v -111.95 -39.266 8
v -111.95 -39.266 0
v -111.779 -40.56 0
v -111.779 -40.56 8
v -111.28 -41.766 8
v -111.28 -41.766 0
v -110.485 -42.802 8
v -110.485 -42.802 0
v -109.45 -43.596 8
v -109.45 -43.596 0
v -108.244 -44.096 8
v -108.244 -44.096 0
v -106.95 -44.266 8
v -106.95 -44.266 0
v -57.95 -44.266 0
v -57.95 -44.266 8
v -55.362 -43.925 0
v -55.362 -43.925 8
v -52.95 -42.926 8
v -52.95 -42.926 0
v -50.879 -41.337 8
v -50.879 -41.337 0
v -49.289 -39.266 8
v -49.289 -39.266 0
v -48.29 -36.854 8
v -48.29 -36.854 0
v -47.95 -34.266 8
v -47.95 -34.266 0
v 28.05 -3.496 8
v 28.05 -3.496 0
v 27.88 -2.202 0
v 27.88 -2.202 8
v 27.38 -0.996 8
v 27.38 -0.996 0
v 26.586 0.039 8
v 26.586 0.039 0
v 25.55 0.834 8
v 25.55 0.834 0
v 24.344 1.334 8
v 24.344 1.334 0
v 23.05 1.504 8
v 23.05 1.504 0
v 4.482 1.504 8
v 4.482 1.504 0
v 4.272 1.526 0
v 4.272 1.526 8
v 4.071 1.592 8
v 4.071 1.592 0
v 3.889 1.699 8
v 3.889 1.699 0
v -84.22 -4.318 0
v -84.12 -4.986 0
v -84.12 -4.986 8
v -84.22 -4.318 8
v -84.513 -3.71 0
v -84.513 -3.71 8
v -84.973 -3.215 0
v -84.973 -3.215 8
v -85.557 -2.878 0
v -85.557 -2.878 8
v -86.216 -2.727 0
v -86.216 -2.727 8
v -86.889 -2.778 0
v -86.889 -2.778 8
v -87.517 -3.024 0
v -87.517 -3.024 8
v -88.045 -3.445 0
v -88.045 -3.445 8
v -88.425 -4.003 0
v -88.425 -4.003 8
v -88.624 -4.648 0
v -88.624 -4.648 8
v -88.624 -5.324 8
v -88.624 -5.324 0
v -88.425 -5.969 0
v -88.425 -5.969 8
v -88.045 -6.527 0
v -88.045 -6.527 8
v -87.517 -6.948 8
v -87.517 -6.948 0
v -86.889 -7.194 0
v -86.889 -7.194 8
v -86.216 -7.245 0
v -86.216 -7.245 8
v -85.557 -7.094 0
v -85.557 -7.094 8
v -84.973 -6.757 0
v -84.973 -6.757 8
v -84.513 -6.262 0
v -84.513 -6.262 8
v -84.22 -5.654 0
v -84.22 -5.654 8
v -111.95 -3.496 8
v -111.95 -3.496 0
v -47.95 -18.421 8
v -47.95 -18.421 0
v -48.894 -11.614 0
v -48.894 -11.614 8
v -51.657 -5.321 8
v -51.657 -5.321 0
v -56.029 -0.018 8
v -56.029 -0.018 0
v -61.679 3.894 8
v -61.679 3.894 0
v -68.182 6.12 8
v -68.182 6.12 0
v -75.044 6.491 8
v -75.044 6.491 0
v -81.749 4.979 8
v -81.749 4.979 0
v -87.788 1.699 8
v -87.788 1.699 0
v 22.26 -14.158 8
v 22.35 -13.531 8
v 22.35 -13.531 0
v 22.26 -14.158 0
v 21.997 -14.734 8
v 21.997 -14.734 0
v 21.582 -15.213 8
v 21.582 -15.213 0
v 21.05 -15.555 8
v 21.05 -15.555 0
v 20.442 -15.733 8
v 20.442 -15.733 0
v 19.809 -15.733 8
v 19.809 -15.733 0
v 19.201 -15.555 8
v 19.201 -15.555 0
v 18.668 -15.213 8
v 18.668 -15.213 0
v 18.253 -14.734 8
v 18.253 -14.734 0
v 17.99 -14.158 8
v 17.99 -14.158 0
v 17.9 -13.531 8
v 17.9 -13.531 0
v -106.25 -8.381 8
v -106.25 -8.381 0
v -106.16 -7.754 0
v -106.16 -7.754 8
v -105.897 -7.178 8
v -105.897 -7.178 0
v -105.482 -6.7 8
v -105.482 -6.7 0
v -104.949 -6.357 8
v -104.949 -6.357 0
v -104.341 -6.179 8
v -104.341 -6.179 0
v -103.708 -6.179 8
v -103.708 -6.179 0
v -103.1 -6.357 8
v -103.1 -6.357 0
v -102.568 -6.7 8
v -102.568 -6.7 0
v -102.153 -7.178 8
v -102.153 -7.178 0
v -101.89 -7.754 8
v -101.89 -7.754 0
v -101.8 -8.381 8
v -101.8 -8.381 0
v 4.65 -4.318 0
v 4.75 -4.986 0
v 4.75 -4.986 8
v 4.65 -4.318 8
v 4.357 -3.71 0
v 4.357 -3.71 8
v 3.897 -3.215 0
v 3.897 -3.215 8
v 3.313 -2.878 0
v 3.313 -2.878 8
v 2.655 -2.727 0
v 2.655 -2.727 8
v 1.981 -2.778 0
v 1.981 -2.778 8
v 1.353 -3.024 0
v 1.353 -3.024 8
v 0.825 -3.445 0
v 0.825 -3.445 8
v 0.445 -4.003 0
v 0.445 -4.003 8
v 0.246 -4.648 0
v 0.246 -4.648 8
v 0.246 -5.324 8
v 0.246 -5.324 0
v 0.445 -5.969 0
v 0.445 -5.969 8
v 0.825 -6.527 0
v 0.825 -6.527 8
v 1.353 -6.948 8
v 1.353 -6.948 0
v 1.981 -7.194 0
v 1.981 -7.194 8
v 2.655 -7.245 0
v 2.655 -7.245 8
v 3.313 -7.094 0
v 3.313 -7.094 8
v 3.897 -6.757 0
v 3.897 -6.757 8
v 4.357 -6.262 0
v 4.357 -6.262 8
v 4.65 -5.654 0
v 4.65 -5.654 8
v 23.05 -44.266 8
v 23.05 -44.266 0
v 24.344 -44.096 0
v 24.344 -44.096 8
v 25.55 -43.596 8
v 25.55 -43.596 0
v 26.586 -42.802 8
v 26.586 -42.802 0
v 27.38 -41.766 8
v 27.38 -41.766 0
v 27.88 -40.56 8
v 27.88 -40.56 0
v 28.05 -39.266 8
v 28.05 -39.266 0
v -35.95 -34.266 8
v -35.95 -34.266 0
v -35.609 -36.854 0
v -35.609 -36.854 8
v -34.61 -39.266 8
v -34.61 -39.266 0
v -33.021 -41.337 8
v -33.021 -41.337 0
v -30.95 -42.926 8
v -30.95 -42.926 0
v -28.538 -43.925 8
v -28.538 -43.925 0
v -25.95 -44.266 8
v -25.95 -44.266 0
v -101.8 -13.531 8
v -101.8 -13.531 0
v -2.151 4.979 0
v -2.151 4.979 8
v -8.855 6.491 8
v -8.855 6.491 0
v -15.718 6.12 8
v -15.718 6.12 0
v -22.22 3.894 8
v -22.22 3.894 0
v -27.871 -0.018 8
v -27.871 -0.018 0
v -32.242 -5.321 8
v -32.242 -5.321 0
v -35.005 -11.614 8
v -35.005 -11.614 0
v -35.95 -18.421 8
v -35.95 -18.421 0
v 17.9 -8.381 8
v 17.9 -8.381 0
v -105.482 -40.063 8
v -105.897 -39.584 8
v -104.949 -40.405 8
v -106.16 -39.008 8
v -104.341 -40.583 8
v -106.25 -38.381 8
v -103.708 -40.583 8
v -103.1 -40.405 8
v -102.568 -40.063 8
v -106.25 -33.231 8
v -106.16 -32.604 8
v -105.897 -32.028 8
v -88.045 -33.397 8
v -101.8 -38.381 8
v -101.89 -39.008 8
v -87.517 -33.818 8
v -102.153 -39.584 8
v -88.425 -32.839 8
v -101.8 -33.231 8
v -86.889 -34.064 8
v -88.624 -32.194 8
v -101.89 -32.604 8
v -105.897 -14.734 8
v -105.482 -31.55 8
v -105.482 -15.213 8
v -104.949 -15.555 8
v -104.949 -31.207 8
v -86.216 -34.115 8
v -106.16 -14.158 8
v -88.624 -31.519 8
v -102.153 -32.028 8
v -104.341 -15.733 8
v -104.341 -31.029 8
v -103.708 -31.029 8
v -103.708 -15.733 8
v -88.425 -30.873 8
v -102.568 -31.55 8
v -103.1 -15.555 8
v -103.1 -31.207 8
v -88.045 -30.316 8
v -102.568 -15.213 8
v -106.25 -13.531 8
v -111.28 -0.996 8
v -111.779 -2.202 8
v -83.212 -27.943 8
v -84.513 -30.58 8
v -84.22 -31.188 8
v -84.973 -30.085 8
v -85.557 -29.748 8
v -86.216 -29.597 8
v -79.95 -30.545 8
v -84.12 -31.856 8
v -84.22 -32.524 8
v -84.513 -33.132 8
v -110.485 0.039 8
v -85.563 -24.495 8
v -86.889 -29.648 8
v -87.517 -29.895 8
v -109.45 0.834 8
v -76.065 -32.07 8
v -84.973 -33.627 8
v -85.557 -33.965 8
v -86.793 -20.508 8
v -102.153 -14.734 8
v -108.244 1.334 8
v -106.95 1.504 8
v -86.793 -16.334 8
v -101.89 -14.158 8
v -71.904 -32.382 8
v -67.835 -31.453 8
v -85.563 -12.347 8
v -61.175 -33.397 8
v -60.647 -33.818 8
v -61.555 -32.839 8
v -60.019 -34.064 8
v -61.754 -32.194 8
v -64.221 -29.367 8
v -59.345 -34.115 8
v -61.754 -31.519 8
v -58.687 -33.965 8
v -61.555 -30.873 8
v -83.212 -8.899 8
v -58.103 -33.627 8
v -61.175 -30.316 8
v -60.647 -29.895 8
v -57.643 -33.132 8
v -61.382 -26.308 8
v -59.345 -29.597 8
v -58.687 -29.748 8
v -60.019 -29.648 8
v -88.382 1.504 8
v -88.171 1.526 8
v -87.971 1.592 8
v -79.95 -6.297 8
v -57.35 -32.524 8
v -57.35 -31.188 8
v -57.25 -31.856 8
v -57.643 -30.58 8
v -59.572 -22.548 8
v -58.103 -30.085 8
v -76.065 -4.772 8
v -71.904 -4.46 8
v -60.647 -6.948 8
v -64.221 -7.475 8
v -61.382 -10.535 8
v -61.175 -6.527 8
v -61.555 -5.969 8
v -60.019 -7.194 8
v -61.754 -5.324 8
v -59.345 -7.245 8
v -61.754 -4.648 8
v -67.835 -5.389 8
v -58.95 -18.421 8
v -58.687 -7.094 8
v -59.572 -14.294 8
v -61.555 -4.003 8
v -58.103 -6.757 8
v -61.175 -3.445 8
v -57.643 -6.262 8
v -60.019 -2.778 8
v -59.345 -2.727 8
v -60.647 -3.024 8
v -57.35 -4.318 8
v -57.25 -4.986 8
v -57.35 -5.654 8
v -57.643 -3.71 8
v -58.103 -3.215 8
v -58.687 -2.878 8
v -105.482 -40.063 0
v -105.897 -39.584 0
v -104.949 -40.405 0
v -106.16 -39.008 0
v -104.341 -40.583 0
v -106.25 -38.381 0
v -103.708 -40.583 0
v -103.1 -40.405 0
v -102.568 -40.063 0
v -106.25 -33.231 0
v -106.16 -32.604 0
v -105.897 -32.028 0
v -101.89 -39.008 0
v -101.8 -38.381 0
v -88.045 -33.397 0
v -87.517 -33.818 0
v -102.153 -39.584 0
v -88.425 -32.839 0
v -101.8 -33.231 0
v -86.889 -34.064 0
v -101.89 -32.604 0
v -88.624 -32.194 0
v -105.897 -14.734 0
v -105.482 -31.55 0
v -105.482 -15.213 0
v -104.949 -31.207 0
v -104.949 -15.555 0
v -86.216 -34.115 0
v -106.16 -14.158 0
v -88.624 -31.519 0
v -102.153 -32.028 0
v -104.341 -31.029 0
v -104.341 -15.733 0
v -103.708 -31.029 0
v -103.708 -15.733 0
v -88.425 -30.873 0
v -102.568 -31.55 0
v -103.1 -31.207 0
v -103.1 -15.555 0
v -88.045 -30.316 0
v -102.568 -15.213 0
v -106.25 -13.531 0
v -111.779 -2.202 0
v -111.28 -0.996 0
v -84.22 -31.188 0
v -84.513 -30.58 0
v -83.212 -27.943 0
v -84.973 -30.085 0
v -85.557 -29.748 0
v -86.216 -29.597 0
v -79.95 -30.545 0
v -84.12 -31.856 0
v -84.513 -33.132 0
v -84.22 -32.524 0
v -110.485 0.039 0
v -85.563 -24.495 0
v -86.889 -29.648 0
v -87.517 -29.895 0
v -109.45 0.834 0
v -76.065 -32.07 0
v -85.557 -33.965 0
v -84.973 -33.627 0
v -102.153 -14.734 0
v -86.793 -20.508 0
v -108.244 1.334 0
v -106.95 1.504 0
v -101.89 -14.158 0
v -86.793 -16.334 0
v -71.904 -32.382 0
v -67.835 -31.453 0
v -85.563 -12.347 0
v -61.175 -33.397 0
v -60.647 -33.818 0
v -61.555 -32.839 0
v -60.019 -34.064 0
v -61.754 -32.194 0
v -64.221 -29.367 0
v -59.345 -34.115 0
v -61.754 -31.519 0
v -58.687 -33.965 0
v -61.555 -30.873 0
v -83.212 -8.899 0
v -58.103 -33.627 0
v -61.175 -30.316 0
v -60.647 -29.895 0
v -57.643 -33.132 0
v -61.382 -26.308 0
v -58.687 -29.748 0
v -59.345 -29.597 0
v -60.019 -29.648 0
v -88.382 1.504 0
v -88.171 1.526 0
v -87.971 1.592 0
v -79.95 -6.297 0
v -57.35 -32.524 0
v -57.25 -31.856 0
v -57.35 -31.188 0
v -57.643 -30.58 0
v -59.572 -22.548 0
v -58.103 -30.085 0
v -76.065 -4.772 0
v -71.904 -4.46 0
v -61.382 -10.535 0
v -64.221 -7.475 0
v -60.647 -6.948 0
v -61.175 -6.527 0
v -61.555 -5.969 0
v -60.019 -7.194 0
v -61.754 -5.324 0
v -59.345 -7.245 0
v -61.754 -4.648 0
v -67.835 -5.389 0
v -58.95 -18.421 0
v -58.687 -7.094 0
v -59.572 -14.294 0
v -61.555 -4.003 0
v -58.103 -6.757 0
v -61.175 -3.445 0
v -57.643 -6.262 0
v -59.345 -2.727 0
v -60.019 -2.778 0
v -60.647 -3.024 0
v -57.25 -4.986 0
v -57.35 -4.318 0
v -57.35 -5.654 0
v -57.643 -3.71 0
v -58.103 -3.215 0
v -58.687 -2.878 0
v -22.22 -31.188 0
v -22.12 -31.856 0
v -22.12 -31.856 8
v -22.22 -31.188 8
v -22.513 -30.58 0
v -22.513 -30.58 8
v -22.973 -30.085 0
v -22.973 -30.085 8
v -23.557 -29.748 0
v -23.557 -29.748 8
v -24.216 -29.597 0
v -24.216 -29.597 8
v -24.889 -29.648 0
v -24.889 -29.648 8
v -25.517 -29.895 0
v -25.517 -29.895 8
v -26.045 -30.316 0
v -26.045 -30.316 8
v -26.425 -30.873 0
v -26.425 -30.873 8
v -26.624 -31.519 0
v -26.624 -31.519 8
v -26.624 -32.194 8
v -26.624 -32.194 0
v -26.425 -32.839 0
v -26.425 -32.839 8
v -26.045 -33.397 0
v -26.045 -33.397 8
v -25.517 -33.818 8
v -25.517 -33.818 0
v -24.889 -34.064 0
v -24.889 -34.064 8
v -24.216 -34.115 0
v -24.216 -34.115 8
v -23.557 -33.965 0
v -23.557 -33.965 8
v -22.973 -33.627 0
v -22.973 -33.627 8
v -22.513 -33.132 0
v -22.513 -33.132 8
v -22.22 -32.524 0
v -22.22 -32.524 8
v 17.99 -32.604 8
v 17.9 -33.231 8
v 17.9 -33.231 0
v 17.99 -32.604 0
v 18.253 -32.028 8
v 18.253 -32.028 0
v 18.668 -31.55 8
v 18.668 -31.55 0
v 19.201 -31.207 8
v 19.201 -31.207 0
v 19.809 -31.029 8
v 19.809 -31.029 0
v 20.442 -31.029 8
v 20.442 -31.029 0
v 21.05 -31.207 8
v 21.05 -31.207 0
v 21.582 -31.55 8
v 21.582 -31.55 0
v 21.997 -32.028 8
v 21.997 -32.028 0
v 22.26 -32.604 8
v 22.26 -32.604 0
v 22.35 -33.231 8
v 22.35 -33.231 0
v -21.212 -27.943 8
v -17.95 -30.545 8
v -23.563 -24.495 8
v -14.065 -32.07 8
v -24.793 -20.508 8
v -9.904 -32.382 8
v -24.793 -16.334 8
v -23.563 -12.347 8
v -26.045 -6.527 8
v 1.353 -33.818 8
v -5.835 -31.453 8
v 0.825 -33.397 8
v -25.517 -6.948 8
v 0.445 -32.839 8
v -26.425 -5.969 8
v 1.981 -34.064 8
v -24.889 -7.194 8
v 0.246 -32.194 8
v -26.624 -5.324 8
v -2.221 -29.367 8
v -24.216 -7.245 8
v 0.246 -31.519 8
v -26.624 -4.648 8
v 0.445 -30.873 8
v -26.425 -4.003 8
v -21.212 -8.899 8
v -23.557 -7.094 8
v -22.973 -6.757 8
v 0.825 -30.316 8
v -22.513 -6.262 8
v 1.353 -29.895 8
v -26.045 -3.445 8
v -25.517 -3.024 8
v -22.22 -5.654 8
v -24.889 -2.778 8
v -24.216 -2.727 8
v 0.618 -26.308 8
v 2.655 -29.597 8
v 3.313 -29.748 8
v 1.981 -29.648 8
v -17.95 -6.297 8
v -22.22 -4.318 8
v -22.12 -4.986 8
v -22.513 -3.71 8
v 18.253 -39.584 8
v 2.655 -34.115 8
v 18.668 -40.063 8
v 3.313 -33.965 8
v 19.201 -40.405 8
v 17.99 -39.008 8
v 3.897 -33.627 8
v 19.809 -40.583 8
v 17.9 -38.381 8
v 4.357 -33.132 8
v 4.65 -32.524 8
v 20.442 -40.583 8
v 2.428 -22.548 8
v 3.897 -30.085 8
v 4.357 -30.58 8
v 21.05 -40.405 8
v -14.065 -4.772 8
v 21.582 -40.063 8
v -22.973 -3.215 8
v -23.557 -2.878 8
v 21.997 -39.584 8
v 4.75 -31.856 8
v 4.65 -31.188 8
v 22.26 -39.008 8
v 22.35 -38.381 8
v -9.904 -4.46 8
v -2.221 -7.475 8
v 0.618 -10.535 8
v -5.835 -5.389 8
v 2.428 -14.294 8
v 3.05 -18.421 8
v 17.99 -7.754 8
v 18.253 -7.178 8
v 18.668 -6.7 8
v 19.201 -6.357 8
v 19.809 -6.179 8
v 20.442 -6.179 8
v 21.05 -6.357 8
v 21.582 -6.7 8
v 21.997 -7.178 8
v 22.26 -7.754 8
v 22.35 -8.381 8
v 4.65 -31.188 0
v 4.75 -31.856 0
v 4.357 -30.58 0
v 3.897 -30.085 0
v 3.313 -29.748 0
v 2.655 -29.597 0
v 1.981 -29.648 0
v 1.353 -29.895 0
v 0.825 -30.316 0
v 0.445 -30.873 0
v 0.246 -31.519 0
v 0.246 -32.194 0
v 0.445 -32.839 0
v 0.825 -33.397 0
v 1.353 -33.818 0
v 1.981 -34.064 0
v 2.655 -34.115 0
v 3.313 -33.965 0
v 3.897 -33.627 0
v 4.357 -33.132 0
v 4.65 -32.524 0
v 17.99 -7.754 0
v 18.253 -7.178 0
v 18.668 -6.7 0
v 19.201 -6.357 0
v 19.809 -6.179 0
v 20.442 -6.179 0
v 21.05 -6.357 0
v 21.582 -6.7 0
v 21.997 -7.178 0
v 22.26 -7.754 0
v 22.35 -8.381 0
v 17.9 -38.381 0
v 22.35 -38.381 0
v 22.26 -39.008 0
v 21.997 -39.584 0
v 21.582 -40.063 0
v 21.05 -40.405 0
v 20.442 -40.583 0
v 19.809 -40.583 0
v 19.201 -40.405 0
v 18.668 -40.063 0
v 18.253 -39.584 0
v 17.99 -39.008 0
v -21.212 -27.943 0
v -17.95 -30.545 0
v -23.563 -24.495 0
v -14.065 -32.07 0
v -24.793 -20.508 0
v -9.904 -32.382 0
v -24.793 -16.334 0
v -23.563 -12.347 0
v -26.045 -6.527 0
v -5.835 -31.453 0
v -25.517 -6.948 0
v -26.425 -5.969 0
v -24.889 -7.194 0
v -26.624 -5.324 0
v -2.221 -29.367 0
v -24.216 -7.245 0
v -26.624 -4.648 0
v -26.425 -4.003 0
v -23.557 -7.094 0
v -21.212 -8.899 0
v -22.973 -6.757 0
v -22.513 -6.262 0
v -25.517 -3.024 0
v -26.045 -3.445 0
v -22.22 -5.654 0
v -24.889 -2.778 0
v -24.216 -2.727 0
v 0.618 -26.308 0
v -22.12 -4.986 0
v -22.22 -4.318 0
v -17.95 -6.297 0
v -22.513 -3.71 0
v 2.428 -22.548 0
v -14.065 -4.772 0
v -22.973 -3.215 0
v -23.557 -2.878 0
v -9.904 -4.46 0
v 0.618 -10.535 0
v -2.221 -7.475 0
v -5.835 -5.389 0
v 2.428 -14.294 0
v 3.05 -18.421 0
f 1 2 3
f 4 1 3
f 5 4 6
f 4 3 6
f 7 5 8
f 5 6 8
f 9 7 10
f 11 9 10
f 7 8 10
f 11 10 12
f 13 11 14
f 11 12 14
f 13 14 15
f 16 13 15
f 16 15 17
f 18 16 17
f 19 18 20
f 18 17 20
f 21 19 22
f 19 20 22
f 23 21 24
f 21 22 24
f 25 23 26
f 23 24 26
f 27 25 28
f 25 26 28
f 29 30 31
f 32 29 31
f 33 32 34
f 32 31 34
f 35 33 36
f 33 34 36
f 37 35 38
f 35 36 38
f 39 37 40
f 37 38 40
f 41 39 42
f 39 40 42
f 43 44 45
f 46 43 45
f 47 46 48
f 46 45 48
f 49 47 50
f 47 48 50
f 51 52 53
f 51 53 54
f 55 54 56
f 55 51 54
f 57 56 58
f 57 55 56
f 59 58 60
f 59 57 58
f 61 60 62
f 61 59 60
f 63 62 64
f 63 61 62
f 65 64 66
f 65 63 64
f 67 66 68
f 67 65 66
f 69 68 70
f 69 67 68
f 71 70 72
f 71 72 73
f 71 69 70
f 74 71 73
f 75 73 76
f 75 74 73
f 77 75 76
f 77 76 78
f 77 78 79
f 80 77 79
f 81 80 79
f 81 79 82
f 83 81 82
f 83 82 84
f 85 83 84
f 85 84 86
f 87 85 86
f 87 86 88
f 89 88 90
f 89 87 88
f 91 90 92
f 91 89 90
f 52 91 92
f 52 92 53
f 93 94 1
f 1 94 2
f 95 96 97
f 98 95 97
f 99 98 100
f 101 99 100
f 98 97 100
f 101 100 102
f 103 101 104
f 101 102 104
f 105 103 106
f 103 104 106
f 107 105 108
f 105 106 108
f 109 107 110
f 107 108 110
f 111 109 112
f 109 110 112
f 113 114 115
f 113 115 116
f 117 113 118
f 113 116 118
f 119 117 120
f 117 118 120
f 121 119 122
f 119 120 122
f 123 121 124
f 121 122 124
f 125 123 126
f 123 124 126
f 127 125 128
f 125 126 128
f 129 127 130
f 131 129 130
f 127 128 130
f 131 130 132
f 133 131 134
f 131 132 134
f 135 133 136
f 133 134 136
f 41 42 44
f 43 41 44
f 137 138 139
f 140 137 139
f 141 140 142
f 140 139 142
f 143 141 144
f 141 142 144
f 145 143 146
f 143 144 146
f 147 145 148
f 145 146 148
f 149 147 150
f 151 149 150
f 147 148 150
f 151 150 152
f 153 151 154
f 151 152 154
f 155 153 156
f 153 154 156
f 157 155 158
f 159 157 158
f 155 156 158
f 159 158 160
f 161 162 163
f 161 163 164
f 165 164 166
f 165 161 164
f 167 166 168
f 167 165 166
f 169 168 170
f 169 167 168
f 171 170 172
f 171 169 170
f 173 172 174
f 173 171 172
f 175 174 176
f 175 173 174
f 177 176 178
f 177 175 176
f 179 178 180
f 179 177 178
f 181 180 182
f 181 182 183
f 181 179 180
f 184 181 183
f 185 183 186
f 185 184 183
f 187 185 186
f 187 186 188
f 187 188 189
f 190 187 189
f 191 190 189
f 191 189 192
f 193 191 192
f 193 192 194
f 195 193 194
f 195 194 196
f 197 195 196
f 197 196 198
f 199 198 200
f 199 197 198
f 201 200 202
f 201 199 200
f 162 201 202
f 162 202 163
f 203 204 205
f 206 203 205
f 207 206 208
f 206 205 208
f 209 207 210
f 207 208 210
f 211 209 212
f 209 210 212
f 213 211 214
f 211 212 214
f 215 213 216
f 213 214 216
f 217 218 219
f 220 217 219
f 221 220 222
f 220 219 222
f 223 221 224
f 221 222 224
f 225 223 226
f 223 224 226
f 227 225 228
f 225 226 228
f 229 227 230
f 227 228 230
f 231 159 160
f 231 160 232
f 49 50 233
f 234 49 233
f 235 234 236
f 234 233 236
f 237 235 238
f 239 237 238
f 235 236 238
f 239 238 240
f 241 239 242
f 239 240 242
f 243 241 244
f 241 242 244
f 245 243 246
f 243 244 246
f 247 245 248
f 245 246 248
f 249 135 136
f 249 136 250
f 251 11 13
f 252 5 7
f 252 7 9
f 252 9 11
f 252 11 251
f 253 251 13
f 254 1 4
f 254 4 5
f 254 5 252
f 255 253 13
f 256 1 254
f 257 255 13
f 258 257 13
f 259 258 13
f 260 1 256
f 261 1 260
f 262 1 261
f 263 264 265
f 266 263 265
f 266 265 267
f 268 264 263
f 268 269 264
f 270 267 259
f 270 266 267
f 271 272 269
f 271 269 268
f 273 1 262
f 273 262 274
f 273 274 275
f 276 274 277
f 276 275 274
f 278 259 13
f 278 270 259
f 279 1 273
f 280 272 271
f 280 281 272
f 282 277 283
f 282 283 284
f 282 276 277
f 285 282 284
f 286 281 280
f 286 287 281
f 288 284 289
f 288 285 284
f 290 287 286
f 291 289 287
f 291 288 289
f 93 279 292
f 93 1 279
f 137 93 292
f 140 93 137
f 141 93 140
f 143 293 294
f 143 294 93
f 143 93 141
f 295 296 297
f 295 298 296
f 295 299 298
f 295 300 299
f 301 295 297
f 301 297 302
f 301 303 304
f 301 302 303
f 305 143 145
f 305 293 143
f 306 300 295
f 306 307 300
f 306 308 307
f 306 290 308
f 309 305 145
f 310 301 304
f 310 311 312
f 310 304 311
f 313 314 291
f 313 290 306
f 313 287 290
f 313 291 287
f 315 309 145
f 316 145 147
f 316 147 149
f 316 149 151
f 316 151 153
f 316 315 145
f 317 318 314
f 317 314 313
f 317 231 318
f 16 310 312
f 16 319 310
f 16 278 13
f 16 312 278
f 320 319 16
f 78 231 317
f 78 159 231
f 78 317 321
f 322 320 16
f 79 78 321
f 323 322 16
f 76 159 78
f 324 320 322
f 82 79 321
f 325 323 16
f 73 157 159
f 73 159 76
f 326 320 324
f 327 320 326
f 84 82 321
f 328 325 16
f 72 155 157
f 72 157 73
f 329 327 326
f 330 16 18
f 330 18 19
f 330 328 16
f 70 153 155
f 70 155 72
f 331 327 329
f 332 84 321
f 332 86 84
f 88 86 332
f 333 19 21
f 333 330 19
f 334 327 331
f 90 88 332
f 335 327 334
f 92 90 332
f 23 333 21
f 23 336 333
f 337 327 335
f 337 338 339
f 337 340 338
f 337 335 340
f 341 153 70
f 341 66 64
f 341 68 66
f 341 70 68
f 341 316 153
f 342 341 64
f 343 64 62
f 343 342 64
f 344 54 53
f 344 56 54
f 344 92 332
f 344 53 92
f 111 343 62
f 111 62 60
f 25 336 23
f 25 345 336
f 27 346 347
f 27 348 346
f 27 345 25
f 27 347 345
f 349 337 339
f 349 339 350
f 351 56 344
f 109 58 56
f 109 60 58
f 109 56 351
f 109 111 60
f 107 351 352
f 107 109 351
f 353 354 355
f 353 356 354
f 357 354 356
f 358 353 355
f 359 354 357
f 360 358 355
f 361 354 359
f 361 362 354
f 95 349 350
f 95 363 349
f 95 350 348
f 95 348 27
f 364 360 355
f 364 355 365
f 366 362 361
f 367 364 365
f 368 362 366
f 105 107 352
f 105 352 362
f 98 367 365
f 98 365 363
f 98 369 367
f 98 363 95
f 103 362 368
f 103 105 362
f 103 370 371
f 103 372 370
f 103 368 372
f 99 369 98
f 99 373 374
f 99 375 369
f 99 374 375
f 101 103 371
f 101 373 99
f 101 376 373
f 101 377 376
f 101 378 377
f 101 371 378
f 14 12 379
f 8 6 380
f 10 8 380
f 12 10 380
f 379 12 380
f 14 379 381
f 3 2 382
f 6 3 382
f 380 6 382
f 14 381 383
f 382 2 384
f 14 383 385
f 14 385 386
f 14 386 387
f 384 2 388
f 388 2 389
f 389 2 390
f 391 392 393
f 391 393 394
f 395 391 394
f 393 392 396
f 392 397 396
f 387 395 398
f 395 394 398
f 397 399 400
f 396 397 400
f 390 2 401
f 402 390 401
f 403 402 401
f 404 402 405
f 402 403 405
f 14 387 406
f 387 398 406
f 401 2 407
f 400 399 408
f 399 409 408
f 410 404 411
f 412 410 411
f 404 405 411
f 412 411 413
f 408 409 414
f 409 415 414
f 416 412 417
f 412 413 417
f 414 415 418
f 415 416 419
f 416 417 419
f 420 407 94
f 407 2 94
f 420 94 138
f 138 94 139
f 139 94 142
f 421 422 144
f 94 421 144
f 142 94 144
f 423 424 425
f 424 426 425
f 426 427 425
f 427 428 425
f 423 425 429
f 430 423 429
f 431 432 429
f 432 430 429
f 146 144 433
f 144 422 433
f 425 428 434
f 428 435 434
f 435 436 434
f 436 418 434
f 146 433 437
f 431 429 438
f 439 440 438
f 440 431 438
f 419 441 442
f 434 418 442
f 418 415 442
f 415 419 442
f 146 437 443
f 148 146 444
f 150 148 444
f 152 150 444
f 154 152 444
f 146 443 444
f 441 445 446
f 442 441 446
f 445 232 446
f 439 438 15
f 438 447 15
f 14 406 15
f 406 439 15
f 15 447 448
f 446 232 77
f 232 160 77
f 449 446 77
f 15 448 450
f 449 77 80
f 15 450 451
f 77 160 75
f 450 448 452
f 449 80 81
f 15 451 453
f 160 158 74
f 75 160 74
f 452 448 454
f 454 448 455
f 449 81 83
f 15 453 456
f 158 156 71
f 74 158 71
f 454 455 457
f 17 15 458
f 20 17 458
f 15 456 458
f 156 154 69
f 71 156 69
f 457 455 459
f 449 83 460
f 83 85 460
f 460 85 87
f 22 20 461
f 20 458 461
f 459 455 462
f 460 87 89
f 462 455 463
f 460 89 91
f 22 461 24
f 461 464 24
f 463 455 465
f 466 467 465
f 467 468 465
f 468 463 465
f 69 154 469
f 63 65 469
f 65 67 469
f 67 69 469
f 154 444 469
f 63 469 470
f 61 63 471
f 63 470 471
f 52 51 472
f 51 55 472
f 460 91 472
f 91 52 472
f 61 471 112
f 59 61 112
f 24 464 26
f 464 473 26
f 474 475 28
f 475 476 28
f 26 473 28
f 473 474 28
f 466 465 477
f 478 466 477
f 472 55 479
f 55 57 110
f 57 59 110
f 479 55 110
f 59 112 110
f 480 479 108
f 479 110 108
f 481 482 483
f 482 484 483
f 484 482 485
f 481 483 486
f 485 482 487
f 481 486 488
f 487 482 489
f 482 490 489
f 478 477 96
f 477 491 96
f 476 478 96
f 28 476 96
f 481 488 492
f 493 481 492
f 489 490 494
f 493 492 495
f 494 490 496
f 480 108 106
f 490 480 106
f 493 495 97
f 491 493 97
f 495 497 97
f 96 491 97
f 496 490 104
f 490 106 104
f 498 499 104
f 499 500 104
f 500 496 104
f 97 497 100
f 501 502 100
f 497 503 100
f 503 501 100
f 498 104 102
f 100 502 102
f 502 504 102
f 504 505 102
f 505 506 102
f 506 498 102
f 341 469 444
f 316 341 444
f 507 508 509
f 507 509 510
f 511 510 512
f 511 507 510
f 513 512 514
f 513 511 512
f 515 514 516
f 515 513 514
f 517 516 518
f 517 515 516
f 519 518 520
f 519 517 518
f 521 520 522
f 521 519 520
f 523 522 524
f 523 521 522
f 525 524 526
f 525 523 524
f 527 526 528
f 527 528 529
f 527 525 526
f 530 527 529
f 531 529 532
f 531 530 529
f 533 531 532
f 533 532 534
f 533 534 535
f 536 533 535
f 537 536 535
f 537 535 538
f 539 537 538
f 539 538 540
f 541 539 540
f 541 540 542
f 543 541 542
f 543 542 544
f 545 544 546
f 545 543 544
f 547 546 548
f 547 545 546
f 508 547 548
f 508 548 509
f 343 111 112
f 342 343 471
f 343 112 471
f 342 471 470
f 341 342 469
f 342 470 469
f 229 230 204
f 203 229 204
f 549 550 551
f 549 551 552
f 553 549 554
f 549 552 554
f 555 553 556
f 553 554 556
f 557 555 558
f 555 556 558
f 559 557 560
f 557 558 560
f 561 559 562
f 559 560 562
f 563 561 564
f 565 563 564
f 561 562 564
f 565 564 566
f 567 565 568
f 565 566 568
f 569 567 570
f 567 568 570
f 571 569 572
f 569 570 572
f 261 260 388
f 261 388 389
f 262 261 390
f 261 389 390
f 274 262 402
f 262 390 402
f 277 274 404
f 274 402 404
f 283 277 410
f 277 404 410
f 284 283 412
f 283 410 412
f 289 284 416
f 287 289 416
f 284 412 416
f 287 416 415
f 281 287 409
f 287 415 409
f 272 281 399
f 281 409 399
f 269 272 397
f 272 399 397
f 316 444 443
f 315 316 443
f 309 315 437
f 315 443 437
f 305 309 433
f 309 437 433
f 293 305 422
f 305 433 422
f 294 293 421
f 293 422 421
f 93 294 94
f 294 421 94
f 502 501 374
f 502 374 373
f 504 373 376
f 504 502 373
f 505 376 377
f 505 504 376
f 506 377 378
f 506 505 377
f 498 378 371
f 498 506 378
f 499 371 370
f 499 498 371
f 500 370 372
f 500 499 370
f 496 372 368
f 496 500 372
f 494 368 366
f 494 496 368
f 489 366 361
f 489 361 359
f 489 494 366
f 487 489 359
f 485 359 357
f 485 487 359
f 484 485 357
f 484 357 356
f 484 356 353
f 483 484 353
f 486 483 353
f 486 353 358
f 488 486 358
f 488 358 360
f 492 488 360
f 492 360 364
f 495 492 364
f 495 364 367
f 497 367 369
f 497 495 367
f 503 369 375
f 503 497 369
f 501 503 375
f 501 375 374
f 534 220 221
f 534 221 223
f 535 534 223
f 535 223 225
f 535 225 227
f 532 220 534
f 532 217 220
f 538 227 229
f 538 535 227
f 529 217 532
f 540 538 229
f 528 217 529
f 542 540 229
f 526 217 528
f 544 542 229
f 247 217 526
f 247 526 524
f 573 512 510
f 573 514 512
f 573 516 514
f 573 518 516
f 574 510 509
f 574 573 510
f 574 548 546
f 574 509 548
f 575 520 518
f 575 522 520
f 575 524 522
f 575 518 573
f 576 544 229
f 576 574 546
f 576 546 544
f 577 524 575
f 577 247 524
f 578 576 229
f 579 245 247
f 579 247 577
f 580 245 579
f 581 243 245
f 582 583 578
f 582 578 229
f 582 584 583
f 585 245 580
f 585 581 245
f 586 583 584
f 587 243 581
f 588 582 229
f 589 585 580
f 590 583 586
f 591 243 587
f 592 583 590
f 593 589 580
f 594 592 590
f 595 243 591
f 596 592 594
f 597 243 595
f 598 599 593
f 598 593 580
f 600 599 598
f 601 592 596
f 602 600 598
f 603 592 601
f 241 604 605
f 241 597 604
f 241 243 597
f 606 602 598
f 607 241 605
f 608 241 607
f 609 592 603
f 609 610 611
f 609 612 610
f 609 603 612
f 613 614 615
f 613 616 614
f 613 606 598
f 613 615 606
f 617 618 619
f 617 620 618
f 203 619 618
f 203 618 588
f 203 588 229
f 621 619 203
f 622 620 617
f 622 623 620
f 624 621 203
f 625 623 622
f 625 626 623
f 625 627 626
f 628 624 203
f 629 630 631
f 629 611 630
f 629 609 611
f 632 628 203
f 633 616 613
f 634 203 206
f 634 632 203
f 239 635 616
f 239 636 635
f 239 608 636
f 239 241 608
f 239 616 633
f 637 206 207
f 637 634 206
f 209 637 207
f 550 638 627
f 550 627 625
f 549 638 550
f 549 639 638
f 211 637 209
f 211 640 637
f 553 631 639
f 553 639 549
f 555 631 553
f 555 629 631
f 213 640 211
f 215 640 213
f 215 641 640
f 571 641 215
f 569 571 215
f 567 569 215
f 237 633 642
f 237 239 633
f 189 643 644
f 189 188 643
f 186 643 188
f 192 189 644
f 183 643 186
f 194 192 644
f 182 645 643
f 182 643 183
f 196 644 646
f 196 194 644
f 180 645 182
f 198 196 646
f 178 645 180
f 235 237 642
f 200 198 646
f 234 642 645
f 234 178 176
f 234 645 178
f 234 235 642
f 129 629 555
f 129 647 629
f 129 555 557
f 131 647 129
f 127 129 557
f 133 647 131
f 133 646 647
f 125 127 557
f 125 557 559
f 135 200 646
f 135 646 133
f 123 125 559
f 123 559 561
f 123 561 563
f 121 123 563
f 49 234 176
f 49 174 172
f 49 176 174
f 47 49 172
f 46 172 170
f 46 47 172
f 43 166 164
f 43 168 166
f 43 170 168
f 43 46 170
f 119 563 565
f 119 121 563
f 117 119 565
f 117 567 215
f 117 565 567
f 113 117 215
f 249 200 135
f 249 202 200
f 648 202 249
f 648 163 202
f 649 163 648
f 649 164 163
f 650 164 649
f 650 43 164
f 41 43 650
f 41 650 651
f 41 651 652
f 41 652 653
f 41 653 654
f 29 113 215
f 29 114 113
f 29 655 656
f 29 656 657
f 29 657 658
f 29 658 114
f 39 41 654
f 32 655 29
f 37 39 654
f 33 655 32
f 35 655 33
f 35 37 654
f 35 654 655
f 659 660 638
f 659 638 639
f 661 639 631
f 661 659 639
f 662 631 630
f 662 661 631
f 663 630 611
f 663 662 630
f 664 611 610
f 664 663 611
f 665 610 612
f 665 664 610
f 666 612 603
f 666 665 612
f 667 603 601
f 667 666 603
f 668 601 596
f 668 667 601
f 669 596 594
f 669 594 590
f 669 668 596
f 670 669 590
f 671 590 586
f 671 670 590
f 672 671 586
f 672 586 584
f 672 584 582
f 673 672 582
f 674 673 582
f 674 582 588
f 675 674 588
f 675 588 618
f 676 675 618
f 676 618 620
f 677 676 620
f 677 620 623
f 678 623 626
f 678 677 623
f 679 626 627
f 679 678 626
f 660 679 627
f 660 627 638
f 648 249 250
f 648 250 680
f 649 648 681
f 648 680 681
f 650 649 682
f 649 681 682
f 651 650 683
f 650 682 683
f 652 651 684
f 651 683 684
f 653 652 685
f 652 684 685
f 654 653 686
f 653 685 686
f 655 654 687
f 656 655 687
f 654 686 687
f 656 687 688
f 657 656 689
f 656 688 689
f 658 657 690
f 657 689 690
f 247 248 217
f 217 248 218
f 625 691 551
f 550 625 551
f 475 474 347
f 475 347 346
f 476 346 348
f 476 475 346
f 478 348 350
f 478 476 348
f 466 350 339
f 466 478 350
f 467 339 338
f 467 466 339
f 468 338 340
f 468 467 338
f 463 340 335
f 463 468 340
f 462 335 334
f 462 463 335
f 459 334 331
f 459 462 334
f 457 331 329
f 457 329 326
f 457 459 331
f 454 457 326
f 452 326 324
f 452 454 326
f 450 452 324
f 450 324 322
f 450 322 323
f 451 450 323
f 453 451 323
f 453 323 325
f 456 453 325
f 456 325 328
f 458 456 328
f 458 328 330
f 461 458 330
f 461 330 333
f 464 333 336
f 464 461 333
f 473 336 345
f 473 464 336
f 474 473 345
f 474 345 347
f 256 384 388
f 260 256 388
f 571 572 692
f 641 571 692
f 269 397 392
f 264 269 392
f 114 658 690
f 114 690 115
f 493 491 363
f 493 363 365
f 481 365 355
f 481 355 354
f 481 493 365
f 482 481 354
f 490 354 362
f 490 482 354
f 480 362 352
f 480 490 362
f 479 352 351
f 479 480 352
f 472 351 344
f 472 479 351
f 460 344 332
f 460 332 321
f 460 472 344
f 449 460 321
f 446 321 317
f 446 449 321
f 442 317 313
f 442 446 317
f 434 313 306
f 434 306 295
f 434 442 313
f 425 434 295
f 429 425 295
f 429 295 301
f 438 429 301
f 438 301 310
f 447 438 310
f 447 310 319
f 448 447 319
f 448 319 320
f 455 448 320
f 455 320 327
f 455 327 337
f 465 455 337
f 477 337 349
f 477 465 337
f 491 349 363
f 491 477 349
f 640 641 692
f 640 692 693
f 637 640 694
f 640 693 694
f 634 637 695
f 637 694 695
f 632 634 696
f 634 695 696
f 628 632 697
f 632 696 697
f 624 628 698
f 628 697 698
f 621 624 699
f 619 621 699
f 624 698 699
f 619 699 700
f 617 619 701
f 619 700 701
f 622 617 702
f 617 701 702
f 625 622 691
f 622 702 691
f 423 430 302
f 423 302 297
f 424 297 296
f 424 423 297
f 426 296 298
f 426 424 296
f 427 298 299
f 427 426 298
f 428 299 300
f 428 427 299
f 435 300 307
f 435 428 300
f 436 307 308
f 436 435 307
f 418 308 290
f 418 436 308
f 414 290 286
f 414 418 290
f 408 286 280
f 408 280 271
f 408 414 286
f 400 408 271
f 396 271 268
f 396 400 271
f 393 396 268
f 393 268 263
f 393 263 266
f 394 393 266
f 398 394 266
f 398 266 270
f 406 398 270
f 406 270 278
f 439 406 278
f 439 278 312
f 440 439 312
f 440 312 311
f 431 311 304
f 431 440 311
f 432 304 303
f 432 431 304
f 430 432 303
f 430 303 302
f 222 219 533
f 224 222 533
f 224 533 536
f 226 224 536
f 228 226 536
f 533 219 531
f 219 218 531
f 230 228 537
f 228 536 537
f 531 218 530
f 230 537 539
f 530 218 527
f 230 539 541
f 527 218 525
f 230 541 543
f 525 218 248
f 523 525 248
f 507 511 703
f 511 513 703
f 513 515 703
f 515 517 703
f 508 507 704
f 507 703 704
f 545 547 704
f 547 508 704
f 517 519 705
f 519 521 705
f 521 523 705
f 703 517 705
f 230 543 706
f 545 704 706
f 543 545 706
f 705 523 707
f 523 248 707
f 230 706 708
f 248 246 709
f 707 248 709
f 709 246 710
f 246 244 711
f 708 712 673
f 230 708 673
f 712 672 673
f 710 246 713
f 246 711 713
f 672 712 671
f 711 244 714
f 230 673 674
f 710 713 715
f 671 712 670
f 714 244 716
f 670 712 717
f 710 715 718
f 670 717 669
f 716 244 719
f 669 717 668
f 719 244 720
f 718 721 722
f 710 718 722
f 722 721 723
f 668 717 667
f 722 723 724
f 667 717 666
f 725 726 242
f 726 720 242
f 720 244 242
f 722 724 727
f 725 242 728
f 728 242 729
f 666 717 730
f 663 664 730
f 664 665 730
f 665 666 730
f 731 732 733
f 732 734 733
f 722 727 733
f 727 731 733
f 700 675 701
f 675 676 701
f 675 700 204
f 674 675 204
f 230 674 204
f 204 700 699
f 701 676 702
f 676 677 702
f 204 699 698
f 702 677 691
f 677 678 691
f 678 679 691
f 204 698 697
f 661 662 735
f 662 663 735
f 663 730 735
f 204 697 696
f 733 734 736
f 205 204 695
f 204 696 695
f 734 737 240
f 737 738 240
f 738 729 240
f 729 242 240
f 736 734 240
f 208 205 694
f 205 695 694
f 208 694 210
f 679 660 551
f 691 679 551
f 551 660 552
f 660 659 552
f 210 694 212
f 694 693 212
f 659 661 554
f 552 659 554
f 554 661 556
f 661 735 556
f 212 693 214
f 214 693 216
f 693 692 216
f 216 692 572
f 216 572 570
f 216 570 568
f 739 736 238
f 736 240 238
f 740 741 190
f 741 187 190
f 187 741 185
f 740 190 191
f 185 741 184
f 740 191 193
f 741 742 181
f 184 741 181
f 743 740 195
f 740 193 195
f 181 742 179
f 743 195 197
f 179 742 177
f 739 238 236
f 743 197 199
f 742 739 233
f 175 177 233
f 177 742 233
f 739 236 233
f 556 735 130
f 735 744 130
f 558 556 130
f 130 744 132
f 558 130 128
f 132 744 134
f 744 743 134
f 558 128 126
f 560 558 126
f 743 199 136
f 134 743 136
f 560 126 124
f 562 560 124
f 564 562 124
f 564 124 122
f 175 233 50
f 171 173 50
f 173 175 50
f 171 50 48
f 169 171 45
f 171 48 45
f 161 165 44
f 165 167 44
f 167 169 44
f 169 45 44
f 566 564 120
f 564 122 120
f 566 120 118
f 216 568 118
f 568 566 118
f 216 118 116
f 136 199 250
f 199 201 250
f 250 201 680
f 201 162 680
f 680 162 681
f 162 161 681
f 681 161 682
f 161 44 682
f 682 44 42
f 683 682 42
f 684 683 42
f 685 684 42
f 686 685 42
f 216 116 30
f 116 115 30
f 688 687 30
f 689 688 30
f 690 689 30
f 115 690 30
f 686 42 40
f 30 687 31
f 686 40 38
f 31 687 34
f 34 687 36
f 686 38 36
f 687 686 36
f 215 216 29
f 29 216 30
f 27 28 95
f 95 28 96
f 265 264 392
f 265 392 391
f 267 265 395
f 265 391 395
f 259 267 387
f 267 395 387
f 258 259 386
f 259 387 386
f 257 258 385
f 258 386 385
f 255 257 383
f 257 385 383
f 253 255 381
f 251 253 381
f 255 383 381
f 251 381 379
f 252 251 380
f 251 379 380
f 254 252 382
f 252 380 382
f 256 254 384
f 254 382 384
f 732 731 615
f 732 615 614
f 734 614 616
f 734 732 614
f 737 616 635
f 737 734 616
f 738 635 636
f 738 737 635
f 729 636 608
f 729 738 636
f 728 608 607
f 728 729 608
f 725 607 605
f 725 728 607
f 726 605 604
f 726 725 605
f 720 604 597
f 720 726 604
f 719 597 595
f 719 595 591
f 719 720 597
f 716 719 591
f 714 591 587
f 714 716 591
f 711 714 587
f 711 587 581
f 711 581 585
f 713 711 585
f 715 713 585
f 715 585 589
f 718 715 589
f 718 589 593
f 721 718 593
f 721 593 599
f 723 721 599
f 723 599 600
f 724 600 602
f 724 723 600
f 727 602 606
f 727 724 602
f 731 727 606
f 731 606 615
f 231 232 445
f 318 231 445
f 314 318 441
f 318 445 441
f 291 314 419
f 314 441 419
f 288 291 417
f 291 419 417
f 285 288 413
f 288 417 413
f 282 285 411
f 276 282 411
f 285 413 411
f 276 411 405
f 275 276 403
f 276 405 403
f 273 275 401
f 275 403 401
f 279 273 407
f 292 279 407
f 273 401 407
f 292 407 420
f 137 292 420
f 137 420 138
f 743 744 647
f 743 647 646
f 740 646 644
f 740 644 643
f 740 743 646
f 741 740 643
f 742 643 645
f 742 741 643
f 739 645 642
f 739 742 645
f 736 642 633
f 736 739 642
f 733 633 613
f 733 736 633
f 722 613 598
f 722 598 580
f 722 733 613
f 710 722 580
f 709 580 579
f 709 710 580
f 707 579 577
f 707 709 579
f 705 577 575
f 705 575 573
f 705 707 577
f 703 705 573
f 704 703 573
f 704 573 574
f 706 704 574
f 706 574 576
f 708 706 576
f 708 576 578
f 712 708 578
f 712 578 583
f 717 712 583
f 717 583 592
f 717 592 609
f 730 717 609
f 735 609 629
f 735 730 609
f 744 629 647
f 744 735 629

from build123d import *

# Parameters (mm, degrees)
F0_R     = 2.265
F0_R_2   = 14
F1_DEPTH = 8


with BuildPart() as f1:
    # F0 (on Top) → F1 (new body)
    with BuildSketch(Plane.XY):
        with BuildLine():
            Line((-88.381675, 1.503936), (-106.949748, 1.503936))
            ThreePointArc((-106.949748, 1.503936), (-110.485281, 0.03947), (-111.949748, -3.496064))
            Line((-111.949748, -3.496064), (-111.949748, -39.266064))
            ThreePointArc((-111.949748, -39.266064), (-110.485281, -42.801598), (-106.949748, -44.266064))
            Line((-106.949748, -44.266064), (-84.717208, -44.266064))
            Line((-84.717208, -44.266064), (-57.949748, -44.266064))
            ThreePointArc((-57.949748, -44.266064), (-50.87868, -41.337132), (-47.949748, -34.266064))
            Line((-47.949748, -34.266064), (-47.949748, -18.421064))
            ThreePointArc((-47.949748, -18.421064), (-61.679428, 3.894399), (-87.788139, 1.699128))
            ThreePointArc((-87.788139, 1.699128), (-88.069271, 1.553986), (-88.381675, 1.503936))
        make_face()
        with BuildLine():
            Line((-101.799748, -33.231064), (-101.799748, -38.381064))
            ThreePointArc((-101.799748, -38.381064), (-104.024748, -40.606064), (-106.249748, -38.381064))
            Line((-106.249748, -38.381064), (-106.249748, -33.231064))
            ThreePointArc((-106.249748, -33.231064), (-104.024748, -31.006064), (-101.799748, -33.231064))
        make_face(mode=Mode.SUBTRACT)
        with Locations((-86.384776, -31.856093)):
            Circle(F0_R, mode=Mode.SUBTRACT)
        with Locations((-59.514719, -31.856093)):
            Circle(F0_R, mode=Mode.SUBTRACT)
        with BuildLine():
            Line((-106.249748, -13.531064), (-106.249748, -8.381064))
            ThreePointArc((-106.249748, -8.381064), (-104.024748, -6.156064), (-101.799748, -8.381064))
            Line((-101.799748, -8.381064), (-101.799748, -13.531064))
            ThreePointArc((-101.799748, -13.531064), (-104.024748, -15.756064), (-106.249748, -13.531064))
        make_face(mode=Mode.SUBTRACT)
        with Locations((-72.949748, -18.421064)):
            Circle(F0_R_2, mode=Mode.SUBTRACT)
        with Locations((-86.384776, -4.986036)):
            Circle(F0_R, mode=Mode.SUBTRACT)
        with Locations((-59.514719, -4.986036)):
            Circle(F0_R, mode=Mode.SUBTRACT)
        with BuildLine():
            Line((23.050252, 1.503936), (4.48218, 1.503936))
            ThreePointArc((4.48218, 1.503936), (4.169776, 1.553986), (3.888644, 1.699128))
            ThreePointArc((3.888644, 1.699128), (-22.220067, 3.894399), (-35.949748, -18.421064))
            Line((-35.949748, -18.421064), (-35.949748, -34.266064))
            ThreePointArc((-35.949748, -34.266064), (-33.020815, -41.337132), (-25.949748, -44.266064))
            Line((-25.949748, -44.266064), (0.817713, -44.266064))
            Line((0.817713, -44.266064), (23.050252, -44.266064))
            ThreePointArc((23.050252, -44.266064), (26.585786, -42.801598), (28.050252, -39.266064))
            Line((28.050252, -39.266064), (28.050252, -3.496064))
            ThreePointArc((28.050252, -3.496064), (26.585786, 0.03947), (23.050252, 1.503936))
        make_face()
        with Locations((-24.384776, -31.856093)):
            Circle(F0_R, mode=Mode.SUBTRACT)
        with Locations((2.485281, -31.856093)):
            Circle(F0_R, mode=Mode.SUBTRACT)
        with BuildLine():
            Line((22.350252, -33.231064), (22.350252, -38.381064))
            ThreePointArc((22.350252, -38.381064), (20.125252, -40.606064), (17.900252, -38.381064))
            Line((17.900252, -38.381064), (17.900252, -33.231064))
            ThreePointArc((17.900252, -33.231064), (20.125252, -31.006064), (22.350252, -33.231064))
        make_face(mode=Mode.SUBTRACT)
        with Locations((-10.949748, -18.421064)):
            Circle(F0_R_2, mode=Mode.SUBTRACT)
        with BuildLine():
            Line((17.900252, -13.531064), (17.900252, -8.381064))
            ThreePointArc((17.900252, -8.381064), (20.125252, -6.156064), (22.350252, -8.381064))
            Line((22.350252, -8.381064), (22.350252, -13.531064))
            ThreePointArc((22.350252, -13.531064), (20.125252, -15.756064), (17.900252, -13.531064))
        make_face(mode=Mode.SUBTRACT)
        with Locations((-24.384776, -4.986036)):
            Circle(F0_R, mode=Mode.SUBTRACT)
        with Locations((2.485281, -4.986036)):
            Circle(F0_R, mode=Mode.SUBTRACT)
    extrude(amount=F1_DEPTH)


solid = f1.part
